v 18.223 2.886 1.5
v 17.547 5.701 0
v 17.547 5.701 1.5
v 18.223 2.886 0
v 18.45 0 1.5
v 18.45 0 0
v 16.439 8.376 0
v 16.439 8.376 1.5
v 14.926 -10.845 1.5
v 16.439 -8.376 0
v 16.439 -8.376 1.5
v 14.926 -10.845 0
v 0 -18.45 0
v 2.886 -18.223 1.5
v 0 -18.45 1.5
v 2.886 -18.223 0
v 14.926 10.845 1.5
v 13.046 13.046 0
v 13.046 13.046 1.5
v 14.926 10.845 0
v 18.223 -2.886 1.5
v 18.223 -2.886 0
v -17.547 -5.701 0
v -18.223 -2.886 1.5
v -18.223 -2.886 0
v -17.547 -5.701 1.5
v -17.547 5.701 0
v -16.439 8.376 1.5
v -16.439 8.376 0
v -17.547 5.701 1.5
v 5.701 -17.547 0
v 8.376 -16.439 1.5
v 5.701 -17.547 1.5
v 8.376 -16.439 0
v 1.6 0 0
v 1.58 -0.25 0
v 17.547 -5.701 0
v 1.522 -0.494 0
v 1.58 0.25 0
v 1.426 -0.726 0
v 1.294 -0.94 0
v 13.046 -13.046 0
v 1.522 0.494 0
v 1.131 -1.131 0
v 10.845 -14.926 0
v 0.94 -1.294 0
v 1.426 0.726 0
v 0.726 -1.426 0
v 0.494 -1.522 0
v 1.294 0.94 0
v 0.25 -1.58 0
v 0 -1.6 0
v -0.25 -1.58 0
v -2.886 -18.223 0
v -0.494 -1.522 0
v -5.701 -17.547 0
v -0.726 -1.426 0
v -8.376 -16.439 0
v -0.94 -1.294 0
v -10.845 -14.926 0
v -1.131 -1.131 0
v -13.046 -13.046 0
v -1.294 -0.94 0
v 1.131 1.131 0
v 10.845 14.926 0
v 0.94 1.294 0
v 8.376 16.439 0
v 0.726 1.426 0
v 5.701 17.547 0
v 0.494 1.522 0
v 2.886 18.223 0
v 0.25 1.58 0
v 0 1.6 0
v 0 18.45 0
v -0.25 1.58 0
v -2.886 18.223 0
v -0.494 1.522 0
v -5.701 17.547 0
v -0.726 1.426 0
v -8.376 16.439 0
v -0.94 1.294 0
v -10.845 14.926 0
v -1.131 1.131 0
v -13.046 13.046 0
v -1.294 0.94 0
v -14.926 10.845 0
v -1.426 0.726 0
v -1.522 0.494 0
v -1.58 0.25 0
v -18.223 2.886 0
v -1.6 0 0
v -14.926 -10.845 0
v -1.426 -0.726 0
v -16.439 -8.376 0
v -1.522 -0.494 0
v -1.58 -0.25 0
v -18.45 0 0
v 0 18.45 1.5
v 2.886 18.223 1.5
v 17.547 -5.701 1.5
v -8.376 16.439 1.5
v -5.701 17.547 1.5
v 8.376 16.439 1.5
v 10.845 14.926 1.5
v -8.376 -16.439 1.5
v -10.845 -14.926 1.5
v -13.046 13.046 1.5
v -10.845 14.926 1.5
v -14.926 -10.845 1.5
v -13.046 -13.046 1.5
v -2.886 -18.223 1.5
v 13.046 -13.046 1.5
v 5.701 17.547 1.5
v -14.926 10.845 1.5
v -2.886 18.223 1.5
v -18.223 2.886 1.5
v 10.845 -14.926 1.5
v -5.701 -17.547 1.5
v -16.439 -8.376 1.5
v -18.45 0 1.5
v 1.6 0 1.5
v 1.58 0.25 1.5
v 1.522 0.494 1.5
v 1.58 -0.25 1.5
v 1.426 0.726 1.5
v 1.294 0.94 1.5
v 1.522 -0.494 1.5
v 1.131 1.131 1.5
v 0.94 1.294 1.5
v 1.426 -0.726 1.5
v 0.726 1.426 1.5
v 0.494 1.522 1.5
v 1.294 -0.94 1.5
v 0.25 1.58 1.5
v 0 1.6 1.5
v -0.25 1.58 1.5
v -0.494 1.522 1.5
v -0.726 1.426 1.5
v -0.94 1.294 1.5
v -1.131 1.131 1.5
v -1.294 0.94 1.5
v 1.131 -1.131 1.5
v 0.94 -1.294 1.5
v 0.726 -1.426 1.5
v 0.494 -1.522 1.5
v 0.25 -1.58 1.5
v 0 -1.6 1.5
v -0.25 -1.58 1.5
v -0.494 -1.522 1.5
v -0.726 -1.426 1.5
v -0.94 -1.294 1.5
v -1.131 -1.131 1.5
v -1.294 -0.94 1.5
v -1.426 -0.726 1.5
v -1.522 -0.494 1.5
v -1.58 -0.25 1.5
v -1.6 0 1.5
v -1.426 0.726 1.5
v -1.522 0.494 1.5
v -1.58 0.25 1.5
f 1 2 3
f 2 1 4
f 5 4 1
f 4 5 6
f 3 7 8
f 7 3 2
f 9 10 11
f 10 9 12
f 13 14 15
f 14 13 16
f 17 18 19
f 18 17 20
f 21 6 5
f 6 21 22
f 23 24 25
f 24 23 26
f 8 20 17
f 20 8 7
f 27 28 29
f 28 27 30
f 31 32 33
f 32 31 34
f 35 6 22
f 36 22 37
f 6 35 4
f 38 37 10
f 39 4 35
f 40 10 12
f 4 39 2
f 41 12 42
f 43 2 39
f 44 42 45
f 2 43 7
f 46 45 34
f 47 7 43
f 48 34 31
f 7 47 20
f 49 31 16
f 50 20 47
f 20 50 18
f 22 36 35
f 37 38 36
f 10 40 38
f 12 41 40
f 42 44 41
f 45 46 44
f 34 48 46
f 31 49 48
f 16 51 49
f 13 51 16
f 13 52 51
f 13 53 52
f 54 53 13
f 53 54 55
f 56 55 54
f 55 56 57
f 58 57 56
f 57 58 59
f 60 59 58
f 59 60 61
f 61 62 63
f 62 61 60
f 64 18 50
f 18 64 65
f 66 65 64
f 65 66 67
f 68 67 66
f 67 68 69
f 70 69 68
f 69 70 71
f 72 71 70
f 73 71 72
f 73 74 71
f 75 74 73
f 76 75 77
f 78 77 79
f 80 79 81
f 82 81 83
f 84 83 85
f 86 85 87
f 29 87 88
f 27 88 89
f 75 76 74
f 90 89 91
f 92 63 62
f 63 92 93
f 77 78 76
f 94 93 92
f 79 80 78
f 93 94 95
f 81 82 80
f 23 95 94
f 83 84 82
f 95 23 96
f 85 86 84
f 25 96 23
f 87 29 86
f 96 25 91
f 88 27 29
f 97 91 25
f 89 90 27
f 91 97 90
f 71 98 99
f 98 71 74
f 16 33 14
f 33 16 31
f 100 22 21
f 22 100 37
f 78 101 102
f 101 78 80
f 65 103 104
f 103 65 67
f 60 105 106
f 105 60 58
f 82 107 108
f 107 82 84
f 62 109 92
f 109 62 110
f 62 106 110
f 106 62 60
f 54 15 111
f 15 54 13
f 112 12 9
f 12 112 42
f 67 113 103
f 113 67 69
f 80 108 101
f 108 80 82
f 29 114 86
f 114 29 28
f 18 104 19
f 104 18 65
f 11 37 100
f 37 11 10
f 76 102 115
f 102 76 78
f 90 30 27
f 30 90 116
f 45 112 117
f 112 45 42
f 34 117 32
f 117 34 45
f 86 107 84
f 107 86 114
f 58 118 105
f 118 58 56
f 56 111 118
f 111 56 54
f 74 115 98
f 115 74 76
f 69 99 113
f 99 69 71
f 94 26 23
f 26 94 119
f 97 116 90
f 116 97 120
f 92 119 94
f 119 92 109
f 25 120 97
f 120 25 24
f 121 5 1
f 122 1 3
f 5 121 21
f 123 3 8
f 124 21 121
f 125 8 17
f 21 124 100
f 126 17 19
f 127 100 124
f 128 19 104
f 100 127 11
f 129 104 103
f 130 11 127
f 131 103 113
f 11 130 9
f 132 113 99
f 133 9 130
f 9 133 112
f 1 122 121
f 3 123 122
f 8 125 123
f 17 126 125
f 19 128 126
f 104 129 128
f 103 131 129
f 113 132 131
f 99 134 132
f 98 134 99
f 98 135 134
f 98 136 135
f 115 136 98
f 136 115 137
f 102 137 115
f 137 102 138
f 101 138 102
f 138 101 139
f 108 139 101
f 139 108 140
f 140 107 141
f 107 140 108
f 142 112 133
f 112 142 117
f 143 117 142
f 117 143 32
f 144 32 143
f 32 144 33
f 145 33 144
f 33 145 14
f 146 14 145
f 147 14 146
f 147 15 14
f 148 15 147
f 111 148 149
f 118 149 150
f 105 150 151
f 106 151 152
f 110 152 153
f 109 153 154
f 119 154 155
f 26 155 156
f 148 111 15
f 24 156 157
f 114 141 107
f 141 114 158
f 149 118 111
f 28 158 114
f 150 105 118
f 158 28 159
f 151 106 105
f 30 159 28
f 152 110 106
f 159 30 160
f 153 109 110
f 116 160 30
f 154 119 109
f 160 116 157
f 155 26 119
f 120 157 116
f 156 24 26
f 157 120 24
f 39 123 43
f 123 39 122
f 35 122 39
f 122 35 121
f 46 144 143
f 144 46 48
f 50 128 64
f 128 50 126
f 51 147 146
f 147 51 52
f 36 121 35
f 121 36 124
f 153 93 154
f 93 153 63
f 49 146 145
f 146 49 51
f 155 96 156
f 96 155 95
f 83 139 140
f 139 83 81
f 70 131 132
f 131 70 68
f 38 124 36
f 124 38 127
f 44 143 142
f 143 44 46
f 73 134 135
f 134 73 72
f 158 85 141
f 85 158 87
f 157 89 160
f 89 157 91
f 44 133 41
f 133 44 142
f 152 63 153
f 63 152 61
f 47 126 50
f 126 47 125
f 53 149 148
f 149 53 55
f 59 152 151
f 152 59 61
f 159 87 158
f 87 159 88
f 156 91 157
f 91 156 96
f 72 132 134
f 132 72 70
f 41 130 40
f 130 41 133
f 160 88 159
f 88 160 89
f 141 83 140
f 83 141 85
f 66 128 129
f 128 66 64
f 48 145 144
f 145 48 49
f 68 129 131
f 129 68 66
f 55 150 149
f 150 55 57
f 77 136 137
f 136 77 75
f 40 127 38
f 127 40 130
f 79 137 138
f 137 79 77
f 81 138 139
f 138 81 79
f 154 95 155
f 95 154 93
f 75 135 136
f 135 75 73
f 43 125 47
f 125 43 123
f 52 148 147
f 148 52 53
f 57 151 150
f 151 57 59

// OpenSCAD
outter_dia = 36.9;
height = 1.5;
hole_dia = 3;

difference() {
    color("blue") cylinder(h = height, d = outter_dia, $fn = 40);
    translate([0, 0, -0.1]) color("red") cylinder(h = height + 0.2, d = hole_dia + 0.2, $fn = 40);
}
